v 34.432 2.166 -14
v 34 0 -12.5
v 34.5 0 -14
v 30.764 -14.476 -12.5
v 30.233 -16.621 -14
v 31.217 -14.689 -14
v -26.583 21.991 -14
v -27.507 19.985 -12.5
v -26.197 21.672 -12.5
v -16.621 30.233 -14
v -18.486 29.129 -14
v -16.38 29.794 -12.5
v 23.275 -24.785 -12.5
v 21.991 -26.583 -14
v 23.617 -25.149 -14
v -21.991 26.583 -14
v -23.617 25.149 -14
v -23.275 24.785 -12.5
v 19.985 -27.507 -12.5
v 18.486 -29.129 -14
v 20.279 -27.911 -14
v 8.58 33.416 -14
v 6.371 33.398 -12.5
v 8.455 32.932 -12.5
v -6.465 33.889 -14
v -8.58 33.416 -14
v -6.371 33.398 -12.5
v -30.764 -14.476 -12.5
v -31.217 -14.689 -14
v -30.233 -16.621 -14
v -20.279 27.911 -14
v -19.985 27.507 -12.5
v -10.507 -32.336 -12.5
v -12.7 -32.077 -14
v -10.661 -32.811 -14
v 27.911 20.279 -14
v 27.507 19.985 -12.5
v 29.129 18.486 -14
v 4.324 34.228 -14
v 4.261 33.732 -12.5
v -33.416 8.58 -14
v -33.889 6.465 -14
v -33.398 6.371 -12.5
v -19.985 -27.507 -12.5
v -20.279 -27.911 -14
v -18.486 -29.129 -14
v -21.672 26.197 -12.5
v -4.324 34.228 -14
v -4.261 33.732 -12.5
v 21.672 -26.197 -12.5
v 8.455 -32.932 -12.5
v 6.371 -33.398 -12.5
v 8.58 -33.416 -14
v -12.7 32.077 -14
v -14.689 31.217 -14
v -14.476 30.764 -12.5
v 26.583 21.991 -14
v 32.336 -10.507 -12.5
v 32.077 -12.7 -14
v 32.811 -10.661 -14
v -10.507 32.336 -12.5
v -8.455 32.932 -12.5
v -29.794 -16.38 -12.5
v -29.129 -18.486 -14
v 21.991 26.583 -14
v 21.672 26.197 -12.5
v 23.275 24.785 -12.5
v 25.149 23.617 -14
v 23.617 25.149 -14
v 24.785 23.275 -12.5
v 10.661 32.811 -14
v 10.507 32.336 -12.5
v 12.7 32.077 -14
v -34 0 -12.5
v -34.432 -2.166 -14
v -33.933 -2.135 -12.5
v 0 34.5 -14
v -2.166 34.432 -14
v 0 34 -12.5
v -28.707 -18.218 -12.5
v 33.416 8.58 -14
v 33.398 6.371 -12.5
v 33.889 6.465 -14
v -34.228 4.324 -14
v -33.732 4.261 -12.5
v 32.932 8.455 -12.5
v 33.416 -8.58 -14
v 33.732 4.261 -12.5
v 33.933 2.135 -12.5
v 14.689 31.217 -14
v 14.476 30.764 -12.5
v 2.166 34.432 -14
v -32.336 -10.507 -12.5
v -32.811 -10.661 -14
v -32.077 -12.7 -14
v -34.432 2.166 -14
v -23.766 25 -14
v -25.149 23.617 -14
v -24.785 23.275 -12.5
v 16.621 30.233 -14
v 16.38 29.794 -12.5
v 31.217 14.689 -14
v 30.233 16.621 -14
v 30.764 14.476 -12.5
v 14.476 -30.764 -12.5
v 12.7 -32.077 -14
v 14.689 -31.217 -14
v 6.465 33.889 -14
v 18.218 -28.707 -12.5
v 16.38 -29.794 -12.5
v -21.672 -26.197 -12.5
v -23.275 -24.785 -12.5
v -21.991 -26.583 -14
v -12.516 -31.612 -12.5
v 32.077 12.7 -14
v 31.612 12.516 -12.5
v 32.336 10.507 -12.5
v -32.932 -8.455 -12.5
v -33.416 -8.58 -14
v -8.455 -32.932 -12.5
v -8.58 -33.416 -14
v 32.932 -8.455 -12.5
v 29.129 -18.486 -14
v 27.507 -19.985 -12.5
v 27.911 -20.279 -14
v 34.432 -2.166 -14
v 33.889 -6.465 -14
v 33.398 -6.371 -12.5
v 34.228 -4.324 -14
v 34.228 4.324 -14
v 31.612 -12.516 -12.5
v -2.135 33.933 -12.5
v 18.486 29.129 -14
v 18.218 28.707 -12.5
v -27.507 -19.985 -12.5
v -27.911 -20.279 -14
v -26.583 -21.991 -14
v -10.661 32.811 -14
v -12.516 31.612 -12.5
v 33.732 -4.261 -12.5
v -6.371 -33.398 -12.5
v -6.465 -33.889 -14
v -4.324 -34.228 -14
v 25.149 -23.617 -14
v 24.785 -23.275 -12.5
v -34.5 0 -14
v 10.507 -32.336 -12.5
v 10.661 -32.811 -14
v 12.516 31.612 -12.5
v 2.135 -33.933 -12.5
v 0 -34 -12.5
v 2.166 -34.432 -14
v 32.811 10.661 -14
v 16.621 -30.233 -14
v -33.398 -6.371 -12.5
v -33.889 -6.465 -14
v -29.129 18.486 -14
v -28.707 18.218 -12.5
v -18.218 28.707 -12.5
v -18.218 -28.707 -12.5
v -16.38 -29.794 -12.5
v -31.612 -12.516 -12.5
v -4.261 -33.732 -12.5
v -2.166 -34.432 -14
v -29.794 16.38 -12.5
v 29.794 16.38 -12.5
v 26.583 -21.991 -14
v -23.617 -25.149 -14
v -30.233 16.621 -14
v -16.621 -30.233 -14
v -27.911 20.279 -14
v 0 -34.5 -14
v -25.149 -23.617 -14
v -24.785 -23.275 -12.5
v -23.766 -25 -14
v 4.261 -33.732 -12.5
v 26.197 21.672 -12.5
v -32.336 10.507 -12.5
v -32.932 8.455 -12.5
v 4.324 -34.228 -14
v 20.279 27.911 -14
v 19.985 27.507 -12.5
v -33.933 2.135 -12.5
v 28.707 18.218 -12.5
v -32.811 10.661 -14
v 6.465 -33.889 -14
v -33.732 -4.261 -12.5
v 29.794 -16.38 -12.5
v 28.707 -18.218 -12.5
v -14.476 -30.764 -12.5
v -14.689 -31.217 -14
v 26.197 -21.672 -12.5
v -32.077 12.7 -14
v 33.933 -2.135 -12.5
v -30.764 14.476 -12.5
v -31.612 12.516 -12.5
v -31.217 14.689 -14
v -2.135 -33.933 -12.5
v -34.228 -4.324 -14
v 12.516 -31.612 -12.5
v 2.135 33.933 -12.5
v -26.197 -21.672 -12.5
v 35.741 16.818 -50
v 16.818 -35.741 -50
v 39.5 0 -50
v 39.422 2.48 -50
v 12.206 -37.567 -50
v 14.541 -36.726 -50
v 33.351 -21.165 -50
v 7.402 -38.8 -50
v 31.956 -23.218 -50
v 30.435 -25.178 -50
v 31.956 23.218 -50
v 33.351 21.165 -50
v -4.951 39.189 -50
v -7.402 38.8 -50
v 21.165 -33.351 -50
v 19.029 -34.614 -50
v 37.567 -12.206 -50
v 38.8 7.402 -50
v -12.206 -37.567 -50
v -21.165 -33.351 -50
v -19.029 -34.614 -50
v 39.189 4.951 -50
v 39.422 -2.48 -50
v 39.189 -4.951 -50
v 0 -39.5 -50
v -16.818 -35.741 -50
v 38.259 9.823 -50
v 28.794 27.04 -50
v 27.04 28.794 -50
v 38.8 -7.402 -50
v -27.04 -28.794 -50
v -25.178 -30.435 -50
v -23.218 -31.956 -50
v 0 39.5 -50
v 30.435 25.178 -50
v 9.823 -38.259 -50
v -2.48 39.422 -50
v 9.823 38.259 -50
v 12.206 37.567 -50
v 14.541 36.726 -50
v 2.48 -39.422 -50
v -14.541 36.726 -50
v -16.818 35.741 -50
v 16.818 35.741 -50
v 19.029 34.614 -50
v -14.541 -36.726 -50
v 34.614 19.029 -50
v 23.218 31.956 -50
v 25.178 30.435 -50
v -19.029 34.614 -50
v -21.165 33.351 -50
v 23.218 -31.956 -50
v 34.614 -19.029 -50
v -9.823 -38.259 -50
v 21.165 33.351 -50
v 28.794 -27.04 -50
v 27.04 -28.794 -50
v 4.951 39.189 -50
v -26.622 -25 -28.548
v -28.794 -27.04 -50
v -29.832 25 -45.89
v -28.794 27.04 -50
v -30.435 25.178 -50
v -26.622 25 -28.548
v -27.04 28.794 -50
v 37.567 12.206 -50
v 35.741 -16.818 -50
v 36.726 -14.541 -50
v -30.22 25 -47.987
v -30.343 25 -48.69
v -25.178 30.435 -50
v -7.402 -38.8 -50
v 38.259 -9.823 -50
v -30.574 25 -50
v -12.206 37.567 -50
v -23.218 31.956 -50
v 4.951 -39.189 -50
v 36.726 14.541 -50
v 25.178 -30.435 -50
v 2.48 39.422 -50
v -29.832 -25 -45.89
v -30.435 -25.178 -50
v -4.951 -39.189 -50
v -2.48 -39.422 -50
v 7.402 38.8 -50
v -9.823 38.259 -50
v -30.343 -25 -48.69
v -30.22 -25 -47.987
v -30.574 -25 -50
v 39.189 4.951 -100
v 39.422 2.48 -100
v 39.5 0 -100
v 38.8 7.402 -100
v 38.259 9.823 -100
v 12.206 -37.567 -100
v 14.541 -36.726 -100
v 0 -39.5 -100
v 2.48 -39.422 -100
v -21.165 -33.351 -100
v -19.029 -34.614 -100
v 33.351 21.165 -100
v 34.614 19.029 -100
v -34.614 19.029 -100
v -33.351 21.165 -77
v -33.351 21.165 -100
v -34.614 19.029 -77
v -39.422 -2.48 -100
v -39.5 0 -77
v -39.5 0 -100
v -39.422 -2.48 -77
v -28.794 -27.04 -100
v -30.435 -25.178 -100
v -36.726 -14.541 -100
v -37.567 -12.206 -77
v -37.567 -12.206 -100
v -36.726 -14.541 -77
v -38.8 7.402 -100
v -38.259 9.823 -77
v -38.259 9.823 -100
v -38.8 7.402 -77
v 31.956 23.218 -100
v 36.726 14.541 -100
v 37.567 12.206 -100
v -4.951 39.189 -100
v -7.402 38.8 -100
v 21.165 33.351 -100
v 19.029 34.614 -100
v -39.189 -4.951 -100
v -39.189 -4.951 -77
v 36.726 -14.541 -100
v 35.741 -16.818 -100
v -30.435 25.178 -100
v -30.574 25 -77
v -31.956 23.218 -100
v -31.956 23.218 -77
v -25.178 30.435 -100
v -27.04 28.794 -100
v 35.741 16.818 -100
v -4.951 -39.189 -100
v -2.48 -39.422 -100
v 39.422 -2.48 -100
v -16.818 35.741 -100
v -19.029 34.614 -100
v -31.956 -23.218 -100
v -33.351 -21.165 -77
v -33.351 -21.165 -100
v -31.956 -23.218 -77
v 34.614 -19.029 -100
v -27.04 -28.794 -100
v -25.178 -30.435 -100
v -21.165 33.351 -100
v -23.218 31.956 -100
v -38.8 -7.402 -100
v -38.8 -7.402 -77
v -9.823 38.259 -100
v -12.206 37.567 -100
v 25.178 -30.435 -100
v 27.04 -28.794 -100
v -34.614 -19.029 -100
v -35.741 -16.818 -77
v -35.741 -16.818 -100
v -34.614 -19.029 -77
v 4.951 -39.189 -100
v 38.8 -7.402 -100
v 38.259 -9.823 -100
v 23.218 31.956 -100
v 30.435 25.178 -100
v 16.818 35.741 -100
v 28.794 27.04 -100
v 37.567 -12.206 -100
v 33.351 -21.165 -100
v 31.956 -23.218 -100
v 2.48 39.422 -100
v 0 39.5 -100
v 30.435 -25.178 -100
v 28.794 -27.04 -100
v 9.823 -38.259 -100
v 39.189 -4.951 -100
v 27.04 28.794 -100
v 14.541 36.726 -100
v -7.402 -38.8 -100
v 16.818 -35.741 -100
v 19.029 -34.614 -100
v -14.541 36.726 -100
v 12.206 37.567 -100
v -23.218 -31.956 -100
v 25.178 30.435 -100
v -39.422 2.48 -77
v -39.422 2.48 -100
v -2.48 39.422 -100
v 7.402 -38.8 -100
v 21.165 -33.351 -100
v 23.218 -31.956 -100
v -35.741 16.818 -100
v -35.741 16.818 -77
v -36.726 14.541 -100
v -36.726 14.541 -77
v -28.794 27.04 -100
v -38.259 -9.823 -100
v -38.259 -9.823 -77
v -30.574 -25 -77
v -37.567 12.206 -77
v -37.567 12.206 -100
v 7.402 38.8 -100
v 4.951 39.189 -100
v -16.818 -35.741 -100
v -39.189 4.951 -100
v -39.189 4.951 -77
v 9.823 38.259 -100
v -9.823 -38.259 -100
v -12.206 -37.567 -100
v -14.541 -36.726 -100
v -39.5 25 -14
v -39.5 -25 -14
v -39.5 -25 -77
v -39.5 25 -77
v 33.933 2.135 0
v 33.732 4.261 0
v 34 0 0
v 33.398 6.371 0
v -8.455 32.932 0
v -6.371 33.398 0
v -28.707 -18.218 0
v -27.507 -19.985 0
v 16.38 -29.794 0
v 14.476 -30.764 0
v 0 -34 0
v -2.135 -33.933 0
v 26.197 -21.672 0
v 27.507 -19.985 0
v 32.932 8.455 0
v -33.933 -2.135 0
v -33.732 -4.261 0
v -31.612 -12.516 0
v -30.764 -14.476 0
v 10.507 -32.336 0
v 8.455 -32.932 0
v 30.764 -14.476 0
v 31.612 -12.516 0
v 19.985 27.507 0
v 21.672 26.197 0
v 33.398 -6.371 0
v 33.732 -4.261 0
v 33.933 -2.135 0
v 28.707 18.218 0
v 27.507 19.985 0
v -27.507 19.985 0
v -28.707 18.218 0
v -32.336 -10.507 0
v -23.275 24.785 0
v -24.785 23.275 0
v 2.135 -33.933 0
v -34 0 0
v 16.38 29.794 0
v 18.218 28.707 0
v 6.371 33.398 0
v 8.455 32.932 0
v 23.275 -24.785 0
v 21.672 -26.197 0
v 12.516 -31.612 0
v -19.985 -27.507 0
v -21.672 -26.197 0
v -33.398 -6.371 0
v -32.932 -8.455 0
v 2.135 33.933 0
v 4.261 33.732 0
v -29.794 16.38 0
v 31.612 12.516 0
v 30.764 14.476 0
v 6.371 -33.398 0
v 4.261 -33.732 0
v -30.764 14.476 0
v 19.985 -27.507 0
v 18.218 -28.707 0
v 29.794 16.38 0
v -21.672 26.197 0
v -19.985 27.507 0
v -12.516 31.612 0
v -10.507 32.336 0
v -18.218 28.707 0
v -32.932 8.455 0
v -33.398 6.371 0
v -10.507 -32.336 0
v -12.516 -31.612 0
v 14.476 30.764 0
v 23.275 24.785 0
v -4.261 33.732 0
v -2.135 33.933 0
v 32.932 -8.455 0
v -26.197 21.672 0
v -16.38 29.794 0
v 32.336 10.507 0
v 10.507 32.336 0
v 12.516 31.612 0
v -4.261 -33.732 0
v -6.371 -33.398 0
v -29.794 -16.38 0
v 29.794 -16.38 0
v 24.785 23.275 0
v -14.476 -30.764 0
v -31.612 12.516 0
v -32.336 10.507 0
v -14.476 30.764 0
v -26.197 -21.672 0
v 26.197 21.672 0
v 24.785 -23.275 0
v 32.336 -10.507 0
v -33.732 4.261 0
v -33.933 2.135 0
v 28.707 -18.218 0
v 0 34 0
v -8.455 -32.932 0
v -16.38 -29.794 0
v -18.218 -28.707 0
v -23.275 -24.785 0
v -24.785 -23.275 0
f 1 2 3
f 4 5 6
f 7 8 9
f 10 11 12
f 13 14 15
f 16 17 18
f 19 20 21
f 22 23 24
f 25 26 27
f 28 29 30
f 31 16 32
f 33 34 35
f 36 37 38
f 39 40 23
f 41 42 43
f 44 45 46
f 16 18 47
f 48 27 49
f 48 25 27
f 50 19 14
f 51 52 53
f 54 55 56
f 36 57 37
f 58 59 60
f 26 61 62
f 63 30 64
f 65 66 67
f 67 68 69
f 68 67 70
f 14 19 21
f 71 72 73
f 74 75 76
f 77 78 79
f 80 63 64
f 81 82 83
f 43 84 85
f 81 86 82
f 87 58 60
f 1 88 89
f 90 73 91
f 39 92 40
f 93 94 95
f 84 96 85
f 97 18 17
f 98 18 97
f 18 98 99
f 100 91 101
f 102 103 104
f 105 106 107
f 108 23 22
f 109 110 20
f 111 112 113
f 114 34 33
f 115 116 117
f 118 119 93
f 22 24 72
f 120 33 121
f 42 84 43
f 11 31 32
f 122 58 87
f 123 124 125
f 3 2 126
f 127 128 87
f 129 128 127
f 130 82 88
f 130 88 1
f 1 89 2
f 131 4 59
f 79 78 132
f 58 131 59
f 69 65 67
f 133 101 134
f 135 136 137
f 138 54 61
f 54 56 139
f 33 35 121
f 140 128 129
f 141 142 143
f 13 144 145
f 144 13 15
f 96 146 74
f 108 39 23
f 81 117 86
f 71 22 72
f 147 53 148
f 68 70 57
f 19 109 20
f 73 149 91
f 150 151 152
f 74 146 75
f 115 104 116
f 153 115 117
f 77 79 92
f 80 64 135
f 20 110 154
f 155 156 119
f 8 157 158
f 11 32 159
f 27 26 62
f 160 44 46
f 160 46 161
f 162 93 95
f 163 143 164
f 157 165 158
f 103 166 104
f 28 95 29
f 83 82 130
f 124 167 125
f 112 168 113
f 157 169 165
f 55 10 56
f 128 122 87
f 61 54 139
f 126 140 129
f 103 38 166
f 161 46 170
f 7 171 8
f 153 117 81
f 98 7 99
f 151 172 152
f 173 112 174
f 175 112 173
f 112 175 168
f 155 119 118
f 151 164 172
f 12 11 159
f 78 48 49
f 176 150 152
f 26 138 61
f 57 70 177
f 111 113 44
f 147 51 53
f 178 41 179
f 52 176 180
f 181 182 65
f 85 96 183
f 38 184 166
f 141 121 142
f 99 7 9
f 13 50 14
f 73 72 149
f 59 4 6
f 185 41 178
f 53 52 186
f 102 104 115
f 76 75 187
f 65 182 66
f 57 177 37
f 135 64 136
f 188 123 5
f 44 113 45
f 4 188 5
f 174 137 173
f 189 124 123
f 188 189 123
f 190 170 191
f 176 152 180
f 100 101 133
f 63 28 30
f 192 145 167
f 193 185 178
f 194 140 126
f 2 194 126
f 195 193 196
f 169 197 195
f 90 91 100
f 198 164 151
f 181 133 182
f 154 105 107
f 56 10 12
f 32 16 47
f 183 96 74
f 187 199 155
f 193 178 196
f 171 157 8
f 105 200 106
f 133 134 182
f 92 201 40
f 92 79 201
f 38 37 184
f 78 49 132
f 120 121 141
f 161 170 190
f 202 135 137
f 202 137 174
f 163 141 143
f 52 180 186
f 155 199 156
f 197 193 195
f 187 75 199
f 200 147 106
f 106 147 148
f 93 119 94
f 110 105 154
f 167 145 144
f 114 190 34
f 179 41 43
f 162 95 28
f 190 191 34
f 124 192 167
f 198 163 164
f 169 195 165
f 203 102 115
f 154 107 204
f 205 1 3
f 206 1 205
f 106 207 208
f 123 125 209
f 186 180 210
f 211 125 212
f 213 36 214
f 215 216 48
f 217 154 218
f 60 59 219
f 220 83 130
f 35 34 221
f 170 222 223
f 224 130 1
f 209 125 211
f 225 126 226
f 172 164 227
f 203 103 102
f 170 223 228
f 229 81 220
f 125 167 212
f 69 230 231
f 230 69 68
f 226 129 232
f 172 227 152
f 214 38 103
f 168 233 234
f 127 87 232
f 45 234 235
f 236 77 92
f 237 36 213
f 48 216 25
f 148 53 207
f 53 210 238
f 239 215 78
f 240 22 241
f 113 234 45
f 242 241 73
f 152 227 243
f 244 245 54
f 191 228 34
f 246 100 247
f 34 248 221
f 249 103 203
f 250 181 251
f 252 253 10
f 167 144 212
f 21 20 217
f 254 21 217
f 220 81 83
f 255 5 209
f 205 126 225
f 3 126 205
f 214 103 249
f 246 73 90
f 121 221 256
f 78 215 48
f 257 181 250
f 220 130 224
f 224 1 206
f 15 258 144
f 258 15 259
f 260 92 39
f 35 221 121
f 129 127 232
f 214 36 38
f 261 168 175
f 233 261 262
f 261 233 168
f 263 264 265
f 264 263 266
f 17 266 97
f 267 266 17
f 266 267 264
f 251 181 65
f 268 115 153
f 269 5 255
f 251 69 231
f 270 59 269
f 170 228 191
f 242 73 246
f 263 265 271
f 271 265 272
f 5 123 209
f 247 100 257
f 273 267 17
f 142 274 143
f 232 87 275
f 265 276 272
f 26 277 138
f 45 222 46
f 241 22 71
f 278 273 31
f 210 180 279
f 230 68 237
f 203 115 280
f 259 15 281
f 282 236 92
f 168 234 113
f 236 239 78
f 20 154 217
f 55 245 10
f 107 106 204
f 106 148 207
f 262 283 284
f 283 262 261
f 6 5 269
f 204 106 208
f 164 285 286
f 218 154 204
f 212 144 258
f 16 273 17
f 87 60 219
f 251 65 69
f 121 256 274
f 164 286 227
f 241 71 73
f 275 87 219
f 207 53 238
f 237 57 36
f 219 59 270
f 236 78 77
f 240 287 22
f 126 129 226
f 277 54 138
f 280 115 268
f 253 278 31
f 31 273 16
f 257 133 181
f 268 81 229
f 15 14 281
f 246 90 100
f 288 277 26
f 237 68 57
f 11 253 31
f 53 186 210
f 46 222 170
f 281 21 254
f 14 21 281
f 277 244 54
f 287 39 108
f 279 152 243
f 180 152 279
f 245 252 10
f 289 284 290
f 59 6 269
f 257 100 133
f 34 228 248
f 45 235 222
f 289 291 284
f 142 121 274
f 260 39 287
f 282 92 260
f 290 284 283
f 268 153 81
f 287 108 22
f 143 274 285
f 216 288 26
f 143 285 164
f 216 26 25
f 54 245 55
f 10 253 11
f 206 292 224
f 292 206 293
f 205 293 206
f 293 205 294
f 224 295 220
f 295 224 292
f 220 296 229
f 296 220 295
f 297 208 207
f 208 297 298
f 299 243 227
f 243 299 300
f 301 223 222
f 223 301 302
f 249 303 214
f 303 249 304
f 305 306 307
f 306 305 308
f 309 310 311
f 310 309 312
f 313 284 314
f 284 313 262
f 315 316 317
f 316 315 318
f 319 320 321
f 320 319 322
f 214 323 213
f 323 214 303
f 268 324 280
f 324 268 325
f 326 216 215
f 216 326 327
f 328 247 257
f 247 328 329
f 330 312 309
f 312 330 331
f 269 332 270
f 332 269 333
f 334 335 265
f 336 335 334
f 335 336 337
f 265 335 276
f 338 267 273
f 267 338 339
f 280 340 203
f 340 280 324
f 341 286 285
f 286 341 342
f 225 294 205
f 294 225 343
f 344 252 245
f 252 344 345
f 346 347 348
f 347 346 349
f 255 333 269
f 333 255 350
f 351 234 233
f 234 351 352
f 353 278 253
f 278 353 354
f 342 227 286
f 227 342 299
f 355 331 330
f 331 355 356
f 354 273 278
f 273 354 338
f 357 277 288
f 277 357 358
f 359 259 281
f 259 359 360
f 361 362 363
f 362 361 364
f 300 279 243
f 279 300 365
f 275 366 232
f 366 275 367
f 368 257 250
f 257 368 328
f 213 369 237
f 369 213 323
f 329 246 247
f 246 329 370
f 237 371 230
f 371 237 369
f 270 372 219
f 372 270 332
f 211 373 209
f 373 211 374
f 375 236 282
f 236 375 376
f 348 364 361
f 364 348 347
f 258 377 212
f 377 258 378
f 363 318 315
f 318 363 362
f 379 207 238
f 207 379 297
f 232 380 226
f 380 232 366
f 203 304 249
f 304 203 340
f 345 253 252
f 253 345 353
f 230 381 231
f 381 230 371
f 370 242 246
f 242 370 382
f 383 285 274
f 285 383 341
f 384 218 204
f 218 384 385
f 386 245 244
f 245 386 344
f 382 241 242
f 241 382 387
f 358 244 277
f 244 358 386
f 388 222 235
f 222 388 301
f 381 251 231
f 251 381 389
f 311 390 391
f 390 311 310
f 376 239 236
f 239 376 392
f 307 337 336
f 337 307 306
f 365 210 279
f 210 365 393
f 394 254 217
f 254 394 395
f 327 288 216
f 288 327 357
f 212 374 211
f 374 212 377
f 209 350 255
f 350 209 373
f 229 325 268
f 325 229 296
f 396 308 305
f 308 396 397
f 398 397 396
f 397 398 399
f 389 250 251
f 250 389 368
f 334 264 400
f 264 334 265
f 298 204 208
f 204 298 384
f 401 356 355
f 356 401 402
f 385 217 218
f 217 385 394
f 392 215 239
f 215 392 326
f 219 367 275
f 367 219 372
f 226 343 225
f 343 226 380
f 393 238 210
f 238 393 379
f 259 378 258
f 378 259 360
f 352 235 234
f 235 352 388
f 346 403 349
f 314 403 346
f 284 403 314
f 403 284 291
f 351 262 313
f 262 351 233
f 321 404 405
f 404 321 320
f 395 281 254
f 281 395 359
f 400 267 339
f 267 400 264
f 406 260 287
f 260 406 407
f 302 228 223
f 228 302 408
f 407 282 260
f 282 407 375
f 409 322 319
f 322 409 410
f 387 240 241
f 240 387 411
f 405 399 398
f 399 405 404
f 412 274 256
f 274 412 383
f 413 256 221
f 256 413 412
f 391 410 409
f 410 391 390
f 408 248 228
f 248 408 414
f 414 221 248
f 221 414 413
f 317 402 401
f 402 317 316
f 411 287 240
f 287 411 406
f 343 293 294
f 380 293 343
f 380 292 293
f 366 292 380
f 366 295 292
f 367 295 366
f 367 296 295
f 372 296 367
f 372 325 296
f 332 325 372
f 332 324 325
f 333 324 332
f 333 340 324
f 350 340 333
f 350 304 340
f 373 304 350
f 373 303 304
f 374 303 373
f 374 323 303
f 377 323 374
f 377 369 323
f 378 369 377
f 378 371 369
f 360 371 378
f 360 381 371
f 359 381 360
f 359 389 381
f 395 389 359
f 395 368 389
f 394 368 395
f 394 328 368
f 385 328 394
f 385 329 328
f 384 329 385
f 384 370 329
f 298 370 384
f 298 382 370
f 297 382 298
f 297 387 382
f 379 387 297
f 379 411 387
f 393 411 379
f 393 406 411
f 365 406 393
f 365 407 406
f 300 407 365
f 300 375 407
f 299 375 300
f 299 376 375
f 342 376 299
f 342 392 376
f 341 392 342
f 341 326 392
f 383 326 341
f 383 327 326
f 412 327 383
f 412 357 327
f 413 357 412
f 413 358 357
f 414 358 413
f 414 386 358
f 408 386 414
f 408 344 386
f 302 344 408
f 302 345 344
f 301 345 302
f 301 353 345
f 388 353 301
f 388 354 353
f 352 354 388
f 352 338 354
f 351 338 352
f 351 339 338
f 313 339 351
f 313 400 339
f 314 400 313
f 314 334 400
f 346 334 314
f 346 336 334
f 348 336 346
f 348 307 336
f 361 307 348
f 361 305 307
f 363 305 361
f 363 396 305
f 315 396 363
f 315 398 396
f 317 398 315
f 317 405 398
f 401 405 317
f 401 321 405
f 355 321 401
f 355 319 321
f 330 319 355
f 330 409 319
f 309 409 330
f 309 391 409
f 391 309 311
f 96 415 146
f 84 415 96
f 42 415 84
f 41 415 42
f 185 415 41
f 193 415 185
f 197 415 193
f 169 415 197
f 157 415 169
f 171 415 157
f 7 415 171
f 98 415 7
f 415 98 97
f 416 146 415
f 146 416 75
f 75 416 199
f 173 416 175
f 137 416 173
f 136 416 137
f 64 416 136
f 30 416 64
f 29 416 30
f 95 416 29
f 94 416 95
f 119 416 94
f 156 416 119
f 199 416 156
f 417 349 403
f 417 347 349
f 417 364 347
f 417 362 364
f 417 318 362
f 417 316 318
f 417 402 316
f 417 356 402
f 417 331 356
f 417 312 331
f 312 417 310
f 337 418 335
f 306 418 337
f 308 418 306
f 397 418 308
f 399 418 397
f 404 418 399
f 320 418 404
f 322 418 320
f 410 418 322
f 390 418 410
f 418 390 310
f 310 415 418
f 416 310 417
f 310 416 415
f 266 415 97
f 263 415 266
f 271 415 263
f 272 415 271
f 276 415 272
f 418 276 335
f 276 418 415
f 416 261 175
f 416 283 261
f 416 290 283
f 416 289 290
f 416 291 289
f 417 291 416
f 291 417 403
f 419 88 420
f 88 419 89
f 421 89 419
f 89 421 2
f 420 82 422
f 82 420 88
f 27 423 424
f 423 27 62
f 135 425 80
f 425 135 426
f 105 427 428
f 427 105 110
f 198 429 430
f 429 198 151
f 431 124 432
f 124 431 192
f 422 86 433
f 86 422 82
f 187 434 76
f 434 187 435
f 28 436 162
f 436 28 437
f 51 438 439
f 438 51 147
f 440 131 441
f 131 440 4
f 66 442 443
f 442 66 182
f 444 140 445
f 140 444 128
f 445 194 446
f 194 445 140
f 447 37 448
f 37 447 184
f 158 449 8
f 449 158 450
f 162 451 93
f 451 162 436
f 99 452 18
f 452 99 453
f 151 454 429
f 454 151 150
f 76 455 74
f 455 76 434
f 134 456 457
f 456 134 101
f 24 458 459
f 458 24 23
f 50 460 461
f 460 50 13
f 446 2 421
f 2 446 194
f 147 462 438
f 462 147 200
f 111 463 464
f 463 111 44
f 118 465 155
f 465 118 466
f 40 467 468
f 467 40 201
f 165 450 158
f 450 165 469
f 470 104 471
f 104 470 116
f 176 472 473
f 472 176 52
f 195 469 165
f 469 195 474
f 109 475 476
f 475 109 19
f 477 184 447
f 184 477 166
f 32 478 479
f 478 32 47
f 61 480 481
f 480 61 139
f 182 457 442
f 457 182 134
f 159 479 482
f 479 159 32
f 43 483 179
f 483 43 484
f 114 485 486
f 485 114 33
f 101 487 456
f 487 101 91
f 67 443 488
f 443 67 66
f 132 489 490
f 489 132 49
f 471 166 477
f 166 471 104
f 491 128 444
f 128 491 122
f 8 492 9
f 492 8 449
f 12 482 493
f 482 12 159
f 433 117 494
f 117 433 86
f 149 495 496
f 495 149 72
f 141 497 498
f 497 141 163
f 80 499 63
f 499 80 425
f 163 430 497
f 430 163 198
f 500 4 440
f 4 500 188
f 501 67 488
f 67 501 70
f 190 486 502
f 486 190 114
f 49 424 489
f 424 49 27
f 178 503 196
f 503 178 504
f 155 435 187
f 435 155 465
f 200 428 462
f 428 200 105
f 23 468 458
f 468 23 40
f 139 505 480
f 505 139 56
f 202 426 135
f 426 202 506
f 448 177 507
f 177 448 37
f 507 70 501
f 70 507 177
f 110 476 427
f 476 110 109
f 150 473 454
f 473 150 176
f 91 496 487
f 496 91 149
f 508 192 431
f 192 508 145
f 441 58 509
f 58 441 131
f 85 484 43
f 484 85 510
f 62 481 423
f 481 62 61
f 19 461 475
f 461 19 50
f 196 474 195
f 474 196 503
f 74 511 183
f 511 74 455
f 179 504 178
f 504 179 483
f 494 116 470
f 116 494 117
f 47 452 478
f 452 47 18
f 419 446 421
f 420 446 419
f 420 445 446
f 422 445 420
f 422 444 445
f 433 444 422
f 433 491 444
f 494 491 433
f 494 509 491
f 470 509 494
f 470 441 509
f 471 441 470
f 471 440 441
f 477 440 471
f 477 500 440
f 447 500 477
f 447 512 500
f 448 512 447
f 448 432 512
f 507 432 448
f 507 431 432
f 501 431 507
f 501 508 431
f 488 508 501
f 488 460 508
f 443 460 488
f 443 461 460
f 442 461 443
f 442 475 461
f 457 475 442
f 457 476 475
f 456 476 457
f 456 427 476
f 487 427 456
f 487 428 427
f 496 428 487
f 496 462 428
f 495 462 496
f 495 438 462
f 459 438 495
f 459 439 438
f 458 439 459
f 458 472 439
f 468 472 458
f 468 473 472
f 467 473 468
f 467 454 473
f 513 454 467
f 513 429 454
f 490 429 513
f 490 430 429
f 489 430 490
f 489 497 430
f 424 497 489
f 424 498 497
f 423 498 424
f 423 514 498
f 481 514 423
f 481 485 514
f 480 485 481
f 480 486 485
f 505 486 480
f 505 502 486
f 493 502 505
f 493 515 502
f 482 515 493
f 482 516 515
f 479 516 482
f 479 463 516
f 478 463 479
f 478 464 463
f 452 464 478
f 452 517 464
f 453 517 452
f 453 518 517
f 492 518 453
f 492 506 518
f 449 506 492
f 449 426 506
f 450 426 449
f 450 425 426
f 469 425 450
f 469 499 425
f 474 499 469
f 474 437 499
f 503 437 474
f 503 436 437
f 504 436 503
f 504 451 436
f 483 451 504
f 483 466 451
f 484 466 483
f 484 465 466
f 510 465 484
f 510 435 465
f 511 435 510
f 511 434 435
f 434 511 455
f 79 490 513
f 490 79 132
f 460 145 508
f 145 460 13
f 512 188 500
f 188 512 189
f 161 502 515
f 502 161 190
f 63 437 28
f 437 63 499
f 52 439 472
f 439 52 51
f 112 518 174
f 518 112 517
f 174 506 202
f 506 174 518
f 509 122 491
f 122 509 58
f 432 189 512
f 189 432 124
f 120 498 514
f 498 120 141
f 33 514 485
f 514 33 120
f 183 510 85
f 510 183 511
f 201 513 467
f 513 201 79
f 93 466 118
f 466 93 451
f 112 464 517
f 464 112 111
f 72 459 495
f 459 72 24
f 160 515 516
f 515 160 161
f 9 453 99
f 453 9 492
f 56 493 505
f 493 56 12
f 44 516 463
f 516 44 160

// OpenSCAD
// recreation of the Laser_Level head-unit from the workshop
// John Bargman 2020-11-19

//all measurements in millimeters

// Top of the laser level
module LaserLevel()
{
//Add this tolerance to all measurements (to slip-fit)
Tolerance = 0.5;
//Set to height detail only for rendering:
$fn= $preview == true? 50 : 100;


//measurements for the cylender section at the top of the cone.
Circle_Diameter = 67;
Circle_Diameter_BatteryBox_Top = 68;
Circle_Radius= Circle_Diameter /2 ;

//measurements for the battery box
BatteryBox_Width = 49 
    + (Tolerance *2);
BatteryBox_Height=62
    + (Tolerance *2);

BatteryBox_Bottom_Depth=7.5;
BatteryBox_Top_Middle_Depth=5.5;


//lower cone diameter
Cone_Middle_Circle_Diameter = 78;
Cone_Bottom_Circle_Diameter = 78;

Circle_Height = 12;
BatteryBox_Top_Height=14;
Level_Middle_Distance = 50;
LaserLevel_Total_Height = 100;

origin = [0,0,0];

    translate(origin)
    union()
    {
        Circle_Dist = Circle_Height + Tolerance;
        //Combine Battery Box and Conical Center
        Gimble_Base_Top = Circle_Diameter + (Tolerance * 2);
        Gimble_Base_BatteryBox_Top= Circle_Diameter_BatteryBox_Top +(Tolerance * 2);
        Gimble_Base_Middle = Cone_Middle_Circle_Diameter  +(Tolerance * 2);
        Gimble_Base_Bottom = Cone_Bottom_Circle_Diameter +(Tolerance * 2);
 
        BatteryBox_Distance = (Circle_Radius + (BatteryBox_Top_Middle_Depth + Tolerance));
        //Battery Box is a rough cube, translated into position.
        translate([-BatteryBox_Distance,-BatteryBox_Width/2, -(BatteryBox_Height + BatteryBox_Top_Height)])
            cube([BatteryBox_Distance,
                BatteryBox_Width,
                BatteryBox_Height]);
        
        //Top Circular fitting is modeled as a rough cylender
        translate([0,0,-Circle_Dist])
            cylinder(h = Circle_Dist,
                d1 = Gimble_Base_Top,
                d2 = Gimble_Base_Top);

        //Conical top secion modeled as a series of cones
        union()
        {
            First_Cone_Base = BatteryBox_Top_Height;
            First_Cone_Height = BatteryBox_Top_Height - Circle_Dist;
            Second_Cone_Base = Level_Middle_Distance;
            Second_Cone_Height = Level_Middle_Distance - First_Cone_Base;
            translate([0,0,-First_Cone_Base])
                cylinder(h = First_Cone_Height, 
                    d1 = Gimble_Base_BatteryBox_Top, 
                    d2 = Gimble_Base_Top);
            translate([0,0, -Second_Cone_Base])
                cylinder(h = Second_Cone_Height,
                d1 = Gimble_Base_Middle,
                d2 = Gimble_Base_BatteryBox_Top);
            translate([0,0,-LaserLevel_Total_Height])
                    cylinder(
                        h = LaserLevel_Total_Height - Second_Cone_Base, 
                        d1 = Gimble_Base_Bottom, 
                        d2 = Gimble_Base_Middle);
        }
        
    }
    
}

LaserLevel();
